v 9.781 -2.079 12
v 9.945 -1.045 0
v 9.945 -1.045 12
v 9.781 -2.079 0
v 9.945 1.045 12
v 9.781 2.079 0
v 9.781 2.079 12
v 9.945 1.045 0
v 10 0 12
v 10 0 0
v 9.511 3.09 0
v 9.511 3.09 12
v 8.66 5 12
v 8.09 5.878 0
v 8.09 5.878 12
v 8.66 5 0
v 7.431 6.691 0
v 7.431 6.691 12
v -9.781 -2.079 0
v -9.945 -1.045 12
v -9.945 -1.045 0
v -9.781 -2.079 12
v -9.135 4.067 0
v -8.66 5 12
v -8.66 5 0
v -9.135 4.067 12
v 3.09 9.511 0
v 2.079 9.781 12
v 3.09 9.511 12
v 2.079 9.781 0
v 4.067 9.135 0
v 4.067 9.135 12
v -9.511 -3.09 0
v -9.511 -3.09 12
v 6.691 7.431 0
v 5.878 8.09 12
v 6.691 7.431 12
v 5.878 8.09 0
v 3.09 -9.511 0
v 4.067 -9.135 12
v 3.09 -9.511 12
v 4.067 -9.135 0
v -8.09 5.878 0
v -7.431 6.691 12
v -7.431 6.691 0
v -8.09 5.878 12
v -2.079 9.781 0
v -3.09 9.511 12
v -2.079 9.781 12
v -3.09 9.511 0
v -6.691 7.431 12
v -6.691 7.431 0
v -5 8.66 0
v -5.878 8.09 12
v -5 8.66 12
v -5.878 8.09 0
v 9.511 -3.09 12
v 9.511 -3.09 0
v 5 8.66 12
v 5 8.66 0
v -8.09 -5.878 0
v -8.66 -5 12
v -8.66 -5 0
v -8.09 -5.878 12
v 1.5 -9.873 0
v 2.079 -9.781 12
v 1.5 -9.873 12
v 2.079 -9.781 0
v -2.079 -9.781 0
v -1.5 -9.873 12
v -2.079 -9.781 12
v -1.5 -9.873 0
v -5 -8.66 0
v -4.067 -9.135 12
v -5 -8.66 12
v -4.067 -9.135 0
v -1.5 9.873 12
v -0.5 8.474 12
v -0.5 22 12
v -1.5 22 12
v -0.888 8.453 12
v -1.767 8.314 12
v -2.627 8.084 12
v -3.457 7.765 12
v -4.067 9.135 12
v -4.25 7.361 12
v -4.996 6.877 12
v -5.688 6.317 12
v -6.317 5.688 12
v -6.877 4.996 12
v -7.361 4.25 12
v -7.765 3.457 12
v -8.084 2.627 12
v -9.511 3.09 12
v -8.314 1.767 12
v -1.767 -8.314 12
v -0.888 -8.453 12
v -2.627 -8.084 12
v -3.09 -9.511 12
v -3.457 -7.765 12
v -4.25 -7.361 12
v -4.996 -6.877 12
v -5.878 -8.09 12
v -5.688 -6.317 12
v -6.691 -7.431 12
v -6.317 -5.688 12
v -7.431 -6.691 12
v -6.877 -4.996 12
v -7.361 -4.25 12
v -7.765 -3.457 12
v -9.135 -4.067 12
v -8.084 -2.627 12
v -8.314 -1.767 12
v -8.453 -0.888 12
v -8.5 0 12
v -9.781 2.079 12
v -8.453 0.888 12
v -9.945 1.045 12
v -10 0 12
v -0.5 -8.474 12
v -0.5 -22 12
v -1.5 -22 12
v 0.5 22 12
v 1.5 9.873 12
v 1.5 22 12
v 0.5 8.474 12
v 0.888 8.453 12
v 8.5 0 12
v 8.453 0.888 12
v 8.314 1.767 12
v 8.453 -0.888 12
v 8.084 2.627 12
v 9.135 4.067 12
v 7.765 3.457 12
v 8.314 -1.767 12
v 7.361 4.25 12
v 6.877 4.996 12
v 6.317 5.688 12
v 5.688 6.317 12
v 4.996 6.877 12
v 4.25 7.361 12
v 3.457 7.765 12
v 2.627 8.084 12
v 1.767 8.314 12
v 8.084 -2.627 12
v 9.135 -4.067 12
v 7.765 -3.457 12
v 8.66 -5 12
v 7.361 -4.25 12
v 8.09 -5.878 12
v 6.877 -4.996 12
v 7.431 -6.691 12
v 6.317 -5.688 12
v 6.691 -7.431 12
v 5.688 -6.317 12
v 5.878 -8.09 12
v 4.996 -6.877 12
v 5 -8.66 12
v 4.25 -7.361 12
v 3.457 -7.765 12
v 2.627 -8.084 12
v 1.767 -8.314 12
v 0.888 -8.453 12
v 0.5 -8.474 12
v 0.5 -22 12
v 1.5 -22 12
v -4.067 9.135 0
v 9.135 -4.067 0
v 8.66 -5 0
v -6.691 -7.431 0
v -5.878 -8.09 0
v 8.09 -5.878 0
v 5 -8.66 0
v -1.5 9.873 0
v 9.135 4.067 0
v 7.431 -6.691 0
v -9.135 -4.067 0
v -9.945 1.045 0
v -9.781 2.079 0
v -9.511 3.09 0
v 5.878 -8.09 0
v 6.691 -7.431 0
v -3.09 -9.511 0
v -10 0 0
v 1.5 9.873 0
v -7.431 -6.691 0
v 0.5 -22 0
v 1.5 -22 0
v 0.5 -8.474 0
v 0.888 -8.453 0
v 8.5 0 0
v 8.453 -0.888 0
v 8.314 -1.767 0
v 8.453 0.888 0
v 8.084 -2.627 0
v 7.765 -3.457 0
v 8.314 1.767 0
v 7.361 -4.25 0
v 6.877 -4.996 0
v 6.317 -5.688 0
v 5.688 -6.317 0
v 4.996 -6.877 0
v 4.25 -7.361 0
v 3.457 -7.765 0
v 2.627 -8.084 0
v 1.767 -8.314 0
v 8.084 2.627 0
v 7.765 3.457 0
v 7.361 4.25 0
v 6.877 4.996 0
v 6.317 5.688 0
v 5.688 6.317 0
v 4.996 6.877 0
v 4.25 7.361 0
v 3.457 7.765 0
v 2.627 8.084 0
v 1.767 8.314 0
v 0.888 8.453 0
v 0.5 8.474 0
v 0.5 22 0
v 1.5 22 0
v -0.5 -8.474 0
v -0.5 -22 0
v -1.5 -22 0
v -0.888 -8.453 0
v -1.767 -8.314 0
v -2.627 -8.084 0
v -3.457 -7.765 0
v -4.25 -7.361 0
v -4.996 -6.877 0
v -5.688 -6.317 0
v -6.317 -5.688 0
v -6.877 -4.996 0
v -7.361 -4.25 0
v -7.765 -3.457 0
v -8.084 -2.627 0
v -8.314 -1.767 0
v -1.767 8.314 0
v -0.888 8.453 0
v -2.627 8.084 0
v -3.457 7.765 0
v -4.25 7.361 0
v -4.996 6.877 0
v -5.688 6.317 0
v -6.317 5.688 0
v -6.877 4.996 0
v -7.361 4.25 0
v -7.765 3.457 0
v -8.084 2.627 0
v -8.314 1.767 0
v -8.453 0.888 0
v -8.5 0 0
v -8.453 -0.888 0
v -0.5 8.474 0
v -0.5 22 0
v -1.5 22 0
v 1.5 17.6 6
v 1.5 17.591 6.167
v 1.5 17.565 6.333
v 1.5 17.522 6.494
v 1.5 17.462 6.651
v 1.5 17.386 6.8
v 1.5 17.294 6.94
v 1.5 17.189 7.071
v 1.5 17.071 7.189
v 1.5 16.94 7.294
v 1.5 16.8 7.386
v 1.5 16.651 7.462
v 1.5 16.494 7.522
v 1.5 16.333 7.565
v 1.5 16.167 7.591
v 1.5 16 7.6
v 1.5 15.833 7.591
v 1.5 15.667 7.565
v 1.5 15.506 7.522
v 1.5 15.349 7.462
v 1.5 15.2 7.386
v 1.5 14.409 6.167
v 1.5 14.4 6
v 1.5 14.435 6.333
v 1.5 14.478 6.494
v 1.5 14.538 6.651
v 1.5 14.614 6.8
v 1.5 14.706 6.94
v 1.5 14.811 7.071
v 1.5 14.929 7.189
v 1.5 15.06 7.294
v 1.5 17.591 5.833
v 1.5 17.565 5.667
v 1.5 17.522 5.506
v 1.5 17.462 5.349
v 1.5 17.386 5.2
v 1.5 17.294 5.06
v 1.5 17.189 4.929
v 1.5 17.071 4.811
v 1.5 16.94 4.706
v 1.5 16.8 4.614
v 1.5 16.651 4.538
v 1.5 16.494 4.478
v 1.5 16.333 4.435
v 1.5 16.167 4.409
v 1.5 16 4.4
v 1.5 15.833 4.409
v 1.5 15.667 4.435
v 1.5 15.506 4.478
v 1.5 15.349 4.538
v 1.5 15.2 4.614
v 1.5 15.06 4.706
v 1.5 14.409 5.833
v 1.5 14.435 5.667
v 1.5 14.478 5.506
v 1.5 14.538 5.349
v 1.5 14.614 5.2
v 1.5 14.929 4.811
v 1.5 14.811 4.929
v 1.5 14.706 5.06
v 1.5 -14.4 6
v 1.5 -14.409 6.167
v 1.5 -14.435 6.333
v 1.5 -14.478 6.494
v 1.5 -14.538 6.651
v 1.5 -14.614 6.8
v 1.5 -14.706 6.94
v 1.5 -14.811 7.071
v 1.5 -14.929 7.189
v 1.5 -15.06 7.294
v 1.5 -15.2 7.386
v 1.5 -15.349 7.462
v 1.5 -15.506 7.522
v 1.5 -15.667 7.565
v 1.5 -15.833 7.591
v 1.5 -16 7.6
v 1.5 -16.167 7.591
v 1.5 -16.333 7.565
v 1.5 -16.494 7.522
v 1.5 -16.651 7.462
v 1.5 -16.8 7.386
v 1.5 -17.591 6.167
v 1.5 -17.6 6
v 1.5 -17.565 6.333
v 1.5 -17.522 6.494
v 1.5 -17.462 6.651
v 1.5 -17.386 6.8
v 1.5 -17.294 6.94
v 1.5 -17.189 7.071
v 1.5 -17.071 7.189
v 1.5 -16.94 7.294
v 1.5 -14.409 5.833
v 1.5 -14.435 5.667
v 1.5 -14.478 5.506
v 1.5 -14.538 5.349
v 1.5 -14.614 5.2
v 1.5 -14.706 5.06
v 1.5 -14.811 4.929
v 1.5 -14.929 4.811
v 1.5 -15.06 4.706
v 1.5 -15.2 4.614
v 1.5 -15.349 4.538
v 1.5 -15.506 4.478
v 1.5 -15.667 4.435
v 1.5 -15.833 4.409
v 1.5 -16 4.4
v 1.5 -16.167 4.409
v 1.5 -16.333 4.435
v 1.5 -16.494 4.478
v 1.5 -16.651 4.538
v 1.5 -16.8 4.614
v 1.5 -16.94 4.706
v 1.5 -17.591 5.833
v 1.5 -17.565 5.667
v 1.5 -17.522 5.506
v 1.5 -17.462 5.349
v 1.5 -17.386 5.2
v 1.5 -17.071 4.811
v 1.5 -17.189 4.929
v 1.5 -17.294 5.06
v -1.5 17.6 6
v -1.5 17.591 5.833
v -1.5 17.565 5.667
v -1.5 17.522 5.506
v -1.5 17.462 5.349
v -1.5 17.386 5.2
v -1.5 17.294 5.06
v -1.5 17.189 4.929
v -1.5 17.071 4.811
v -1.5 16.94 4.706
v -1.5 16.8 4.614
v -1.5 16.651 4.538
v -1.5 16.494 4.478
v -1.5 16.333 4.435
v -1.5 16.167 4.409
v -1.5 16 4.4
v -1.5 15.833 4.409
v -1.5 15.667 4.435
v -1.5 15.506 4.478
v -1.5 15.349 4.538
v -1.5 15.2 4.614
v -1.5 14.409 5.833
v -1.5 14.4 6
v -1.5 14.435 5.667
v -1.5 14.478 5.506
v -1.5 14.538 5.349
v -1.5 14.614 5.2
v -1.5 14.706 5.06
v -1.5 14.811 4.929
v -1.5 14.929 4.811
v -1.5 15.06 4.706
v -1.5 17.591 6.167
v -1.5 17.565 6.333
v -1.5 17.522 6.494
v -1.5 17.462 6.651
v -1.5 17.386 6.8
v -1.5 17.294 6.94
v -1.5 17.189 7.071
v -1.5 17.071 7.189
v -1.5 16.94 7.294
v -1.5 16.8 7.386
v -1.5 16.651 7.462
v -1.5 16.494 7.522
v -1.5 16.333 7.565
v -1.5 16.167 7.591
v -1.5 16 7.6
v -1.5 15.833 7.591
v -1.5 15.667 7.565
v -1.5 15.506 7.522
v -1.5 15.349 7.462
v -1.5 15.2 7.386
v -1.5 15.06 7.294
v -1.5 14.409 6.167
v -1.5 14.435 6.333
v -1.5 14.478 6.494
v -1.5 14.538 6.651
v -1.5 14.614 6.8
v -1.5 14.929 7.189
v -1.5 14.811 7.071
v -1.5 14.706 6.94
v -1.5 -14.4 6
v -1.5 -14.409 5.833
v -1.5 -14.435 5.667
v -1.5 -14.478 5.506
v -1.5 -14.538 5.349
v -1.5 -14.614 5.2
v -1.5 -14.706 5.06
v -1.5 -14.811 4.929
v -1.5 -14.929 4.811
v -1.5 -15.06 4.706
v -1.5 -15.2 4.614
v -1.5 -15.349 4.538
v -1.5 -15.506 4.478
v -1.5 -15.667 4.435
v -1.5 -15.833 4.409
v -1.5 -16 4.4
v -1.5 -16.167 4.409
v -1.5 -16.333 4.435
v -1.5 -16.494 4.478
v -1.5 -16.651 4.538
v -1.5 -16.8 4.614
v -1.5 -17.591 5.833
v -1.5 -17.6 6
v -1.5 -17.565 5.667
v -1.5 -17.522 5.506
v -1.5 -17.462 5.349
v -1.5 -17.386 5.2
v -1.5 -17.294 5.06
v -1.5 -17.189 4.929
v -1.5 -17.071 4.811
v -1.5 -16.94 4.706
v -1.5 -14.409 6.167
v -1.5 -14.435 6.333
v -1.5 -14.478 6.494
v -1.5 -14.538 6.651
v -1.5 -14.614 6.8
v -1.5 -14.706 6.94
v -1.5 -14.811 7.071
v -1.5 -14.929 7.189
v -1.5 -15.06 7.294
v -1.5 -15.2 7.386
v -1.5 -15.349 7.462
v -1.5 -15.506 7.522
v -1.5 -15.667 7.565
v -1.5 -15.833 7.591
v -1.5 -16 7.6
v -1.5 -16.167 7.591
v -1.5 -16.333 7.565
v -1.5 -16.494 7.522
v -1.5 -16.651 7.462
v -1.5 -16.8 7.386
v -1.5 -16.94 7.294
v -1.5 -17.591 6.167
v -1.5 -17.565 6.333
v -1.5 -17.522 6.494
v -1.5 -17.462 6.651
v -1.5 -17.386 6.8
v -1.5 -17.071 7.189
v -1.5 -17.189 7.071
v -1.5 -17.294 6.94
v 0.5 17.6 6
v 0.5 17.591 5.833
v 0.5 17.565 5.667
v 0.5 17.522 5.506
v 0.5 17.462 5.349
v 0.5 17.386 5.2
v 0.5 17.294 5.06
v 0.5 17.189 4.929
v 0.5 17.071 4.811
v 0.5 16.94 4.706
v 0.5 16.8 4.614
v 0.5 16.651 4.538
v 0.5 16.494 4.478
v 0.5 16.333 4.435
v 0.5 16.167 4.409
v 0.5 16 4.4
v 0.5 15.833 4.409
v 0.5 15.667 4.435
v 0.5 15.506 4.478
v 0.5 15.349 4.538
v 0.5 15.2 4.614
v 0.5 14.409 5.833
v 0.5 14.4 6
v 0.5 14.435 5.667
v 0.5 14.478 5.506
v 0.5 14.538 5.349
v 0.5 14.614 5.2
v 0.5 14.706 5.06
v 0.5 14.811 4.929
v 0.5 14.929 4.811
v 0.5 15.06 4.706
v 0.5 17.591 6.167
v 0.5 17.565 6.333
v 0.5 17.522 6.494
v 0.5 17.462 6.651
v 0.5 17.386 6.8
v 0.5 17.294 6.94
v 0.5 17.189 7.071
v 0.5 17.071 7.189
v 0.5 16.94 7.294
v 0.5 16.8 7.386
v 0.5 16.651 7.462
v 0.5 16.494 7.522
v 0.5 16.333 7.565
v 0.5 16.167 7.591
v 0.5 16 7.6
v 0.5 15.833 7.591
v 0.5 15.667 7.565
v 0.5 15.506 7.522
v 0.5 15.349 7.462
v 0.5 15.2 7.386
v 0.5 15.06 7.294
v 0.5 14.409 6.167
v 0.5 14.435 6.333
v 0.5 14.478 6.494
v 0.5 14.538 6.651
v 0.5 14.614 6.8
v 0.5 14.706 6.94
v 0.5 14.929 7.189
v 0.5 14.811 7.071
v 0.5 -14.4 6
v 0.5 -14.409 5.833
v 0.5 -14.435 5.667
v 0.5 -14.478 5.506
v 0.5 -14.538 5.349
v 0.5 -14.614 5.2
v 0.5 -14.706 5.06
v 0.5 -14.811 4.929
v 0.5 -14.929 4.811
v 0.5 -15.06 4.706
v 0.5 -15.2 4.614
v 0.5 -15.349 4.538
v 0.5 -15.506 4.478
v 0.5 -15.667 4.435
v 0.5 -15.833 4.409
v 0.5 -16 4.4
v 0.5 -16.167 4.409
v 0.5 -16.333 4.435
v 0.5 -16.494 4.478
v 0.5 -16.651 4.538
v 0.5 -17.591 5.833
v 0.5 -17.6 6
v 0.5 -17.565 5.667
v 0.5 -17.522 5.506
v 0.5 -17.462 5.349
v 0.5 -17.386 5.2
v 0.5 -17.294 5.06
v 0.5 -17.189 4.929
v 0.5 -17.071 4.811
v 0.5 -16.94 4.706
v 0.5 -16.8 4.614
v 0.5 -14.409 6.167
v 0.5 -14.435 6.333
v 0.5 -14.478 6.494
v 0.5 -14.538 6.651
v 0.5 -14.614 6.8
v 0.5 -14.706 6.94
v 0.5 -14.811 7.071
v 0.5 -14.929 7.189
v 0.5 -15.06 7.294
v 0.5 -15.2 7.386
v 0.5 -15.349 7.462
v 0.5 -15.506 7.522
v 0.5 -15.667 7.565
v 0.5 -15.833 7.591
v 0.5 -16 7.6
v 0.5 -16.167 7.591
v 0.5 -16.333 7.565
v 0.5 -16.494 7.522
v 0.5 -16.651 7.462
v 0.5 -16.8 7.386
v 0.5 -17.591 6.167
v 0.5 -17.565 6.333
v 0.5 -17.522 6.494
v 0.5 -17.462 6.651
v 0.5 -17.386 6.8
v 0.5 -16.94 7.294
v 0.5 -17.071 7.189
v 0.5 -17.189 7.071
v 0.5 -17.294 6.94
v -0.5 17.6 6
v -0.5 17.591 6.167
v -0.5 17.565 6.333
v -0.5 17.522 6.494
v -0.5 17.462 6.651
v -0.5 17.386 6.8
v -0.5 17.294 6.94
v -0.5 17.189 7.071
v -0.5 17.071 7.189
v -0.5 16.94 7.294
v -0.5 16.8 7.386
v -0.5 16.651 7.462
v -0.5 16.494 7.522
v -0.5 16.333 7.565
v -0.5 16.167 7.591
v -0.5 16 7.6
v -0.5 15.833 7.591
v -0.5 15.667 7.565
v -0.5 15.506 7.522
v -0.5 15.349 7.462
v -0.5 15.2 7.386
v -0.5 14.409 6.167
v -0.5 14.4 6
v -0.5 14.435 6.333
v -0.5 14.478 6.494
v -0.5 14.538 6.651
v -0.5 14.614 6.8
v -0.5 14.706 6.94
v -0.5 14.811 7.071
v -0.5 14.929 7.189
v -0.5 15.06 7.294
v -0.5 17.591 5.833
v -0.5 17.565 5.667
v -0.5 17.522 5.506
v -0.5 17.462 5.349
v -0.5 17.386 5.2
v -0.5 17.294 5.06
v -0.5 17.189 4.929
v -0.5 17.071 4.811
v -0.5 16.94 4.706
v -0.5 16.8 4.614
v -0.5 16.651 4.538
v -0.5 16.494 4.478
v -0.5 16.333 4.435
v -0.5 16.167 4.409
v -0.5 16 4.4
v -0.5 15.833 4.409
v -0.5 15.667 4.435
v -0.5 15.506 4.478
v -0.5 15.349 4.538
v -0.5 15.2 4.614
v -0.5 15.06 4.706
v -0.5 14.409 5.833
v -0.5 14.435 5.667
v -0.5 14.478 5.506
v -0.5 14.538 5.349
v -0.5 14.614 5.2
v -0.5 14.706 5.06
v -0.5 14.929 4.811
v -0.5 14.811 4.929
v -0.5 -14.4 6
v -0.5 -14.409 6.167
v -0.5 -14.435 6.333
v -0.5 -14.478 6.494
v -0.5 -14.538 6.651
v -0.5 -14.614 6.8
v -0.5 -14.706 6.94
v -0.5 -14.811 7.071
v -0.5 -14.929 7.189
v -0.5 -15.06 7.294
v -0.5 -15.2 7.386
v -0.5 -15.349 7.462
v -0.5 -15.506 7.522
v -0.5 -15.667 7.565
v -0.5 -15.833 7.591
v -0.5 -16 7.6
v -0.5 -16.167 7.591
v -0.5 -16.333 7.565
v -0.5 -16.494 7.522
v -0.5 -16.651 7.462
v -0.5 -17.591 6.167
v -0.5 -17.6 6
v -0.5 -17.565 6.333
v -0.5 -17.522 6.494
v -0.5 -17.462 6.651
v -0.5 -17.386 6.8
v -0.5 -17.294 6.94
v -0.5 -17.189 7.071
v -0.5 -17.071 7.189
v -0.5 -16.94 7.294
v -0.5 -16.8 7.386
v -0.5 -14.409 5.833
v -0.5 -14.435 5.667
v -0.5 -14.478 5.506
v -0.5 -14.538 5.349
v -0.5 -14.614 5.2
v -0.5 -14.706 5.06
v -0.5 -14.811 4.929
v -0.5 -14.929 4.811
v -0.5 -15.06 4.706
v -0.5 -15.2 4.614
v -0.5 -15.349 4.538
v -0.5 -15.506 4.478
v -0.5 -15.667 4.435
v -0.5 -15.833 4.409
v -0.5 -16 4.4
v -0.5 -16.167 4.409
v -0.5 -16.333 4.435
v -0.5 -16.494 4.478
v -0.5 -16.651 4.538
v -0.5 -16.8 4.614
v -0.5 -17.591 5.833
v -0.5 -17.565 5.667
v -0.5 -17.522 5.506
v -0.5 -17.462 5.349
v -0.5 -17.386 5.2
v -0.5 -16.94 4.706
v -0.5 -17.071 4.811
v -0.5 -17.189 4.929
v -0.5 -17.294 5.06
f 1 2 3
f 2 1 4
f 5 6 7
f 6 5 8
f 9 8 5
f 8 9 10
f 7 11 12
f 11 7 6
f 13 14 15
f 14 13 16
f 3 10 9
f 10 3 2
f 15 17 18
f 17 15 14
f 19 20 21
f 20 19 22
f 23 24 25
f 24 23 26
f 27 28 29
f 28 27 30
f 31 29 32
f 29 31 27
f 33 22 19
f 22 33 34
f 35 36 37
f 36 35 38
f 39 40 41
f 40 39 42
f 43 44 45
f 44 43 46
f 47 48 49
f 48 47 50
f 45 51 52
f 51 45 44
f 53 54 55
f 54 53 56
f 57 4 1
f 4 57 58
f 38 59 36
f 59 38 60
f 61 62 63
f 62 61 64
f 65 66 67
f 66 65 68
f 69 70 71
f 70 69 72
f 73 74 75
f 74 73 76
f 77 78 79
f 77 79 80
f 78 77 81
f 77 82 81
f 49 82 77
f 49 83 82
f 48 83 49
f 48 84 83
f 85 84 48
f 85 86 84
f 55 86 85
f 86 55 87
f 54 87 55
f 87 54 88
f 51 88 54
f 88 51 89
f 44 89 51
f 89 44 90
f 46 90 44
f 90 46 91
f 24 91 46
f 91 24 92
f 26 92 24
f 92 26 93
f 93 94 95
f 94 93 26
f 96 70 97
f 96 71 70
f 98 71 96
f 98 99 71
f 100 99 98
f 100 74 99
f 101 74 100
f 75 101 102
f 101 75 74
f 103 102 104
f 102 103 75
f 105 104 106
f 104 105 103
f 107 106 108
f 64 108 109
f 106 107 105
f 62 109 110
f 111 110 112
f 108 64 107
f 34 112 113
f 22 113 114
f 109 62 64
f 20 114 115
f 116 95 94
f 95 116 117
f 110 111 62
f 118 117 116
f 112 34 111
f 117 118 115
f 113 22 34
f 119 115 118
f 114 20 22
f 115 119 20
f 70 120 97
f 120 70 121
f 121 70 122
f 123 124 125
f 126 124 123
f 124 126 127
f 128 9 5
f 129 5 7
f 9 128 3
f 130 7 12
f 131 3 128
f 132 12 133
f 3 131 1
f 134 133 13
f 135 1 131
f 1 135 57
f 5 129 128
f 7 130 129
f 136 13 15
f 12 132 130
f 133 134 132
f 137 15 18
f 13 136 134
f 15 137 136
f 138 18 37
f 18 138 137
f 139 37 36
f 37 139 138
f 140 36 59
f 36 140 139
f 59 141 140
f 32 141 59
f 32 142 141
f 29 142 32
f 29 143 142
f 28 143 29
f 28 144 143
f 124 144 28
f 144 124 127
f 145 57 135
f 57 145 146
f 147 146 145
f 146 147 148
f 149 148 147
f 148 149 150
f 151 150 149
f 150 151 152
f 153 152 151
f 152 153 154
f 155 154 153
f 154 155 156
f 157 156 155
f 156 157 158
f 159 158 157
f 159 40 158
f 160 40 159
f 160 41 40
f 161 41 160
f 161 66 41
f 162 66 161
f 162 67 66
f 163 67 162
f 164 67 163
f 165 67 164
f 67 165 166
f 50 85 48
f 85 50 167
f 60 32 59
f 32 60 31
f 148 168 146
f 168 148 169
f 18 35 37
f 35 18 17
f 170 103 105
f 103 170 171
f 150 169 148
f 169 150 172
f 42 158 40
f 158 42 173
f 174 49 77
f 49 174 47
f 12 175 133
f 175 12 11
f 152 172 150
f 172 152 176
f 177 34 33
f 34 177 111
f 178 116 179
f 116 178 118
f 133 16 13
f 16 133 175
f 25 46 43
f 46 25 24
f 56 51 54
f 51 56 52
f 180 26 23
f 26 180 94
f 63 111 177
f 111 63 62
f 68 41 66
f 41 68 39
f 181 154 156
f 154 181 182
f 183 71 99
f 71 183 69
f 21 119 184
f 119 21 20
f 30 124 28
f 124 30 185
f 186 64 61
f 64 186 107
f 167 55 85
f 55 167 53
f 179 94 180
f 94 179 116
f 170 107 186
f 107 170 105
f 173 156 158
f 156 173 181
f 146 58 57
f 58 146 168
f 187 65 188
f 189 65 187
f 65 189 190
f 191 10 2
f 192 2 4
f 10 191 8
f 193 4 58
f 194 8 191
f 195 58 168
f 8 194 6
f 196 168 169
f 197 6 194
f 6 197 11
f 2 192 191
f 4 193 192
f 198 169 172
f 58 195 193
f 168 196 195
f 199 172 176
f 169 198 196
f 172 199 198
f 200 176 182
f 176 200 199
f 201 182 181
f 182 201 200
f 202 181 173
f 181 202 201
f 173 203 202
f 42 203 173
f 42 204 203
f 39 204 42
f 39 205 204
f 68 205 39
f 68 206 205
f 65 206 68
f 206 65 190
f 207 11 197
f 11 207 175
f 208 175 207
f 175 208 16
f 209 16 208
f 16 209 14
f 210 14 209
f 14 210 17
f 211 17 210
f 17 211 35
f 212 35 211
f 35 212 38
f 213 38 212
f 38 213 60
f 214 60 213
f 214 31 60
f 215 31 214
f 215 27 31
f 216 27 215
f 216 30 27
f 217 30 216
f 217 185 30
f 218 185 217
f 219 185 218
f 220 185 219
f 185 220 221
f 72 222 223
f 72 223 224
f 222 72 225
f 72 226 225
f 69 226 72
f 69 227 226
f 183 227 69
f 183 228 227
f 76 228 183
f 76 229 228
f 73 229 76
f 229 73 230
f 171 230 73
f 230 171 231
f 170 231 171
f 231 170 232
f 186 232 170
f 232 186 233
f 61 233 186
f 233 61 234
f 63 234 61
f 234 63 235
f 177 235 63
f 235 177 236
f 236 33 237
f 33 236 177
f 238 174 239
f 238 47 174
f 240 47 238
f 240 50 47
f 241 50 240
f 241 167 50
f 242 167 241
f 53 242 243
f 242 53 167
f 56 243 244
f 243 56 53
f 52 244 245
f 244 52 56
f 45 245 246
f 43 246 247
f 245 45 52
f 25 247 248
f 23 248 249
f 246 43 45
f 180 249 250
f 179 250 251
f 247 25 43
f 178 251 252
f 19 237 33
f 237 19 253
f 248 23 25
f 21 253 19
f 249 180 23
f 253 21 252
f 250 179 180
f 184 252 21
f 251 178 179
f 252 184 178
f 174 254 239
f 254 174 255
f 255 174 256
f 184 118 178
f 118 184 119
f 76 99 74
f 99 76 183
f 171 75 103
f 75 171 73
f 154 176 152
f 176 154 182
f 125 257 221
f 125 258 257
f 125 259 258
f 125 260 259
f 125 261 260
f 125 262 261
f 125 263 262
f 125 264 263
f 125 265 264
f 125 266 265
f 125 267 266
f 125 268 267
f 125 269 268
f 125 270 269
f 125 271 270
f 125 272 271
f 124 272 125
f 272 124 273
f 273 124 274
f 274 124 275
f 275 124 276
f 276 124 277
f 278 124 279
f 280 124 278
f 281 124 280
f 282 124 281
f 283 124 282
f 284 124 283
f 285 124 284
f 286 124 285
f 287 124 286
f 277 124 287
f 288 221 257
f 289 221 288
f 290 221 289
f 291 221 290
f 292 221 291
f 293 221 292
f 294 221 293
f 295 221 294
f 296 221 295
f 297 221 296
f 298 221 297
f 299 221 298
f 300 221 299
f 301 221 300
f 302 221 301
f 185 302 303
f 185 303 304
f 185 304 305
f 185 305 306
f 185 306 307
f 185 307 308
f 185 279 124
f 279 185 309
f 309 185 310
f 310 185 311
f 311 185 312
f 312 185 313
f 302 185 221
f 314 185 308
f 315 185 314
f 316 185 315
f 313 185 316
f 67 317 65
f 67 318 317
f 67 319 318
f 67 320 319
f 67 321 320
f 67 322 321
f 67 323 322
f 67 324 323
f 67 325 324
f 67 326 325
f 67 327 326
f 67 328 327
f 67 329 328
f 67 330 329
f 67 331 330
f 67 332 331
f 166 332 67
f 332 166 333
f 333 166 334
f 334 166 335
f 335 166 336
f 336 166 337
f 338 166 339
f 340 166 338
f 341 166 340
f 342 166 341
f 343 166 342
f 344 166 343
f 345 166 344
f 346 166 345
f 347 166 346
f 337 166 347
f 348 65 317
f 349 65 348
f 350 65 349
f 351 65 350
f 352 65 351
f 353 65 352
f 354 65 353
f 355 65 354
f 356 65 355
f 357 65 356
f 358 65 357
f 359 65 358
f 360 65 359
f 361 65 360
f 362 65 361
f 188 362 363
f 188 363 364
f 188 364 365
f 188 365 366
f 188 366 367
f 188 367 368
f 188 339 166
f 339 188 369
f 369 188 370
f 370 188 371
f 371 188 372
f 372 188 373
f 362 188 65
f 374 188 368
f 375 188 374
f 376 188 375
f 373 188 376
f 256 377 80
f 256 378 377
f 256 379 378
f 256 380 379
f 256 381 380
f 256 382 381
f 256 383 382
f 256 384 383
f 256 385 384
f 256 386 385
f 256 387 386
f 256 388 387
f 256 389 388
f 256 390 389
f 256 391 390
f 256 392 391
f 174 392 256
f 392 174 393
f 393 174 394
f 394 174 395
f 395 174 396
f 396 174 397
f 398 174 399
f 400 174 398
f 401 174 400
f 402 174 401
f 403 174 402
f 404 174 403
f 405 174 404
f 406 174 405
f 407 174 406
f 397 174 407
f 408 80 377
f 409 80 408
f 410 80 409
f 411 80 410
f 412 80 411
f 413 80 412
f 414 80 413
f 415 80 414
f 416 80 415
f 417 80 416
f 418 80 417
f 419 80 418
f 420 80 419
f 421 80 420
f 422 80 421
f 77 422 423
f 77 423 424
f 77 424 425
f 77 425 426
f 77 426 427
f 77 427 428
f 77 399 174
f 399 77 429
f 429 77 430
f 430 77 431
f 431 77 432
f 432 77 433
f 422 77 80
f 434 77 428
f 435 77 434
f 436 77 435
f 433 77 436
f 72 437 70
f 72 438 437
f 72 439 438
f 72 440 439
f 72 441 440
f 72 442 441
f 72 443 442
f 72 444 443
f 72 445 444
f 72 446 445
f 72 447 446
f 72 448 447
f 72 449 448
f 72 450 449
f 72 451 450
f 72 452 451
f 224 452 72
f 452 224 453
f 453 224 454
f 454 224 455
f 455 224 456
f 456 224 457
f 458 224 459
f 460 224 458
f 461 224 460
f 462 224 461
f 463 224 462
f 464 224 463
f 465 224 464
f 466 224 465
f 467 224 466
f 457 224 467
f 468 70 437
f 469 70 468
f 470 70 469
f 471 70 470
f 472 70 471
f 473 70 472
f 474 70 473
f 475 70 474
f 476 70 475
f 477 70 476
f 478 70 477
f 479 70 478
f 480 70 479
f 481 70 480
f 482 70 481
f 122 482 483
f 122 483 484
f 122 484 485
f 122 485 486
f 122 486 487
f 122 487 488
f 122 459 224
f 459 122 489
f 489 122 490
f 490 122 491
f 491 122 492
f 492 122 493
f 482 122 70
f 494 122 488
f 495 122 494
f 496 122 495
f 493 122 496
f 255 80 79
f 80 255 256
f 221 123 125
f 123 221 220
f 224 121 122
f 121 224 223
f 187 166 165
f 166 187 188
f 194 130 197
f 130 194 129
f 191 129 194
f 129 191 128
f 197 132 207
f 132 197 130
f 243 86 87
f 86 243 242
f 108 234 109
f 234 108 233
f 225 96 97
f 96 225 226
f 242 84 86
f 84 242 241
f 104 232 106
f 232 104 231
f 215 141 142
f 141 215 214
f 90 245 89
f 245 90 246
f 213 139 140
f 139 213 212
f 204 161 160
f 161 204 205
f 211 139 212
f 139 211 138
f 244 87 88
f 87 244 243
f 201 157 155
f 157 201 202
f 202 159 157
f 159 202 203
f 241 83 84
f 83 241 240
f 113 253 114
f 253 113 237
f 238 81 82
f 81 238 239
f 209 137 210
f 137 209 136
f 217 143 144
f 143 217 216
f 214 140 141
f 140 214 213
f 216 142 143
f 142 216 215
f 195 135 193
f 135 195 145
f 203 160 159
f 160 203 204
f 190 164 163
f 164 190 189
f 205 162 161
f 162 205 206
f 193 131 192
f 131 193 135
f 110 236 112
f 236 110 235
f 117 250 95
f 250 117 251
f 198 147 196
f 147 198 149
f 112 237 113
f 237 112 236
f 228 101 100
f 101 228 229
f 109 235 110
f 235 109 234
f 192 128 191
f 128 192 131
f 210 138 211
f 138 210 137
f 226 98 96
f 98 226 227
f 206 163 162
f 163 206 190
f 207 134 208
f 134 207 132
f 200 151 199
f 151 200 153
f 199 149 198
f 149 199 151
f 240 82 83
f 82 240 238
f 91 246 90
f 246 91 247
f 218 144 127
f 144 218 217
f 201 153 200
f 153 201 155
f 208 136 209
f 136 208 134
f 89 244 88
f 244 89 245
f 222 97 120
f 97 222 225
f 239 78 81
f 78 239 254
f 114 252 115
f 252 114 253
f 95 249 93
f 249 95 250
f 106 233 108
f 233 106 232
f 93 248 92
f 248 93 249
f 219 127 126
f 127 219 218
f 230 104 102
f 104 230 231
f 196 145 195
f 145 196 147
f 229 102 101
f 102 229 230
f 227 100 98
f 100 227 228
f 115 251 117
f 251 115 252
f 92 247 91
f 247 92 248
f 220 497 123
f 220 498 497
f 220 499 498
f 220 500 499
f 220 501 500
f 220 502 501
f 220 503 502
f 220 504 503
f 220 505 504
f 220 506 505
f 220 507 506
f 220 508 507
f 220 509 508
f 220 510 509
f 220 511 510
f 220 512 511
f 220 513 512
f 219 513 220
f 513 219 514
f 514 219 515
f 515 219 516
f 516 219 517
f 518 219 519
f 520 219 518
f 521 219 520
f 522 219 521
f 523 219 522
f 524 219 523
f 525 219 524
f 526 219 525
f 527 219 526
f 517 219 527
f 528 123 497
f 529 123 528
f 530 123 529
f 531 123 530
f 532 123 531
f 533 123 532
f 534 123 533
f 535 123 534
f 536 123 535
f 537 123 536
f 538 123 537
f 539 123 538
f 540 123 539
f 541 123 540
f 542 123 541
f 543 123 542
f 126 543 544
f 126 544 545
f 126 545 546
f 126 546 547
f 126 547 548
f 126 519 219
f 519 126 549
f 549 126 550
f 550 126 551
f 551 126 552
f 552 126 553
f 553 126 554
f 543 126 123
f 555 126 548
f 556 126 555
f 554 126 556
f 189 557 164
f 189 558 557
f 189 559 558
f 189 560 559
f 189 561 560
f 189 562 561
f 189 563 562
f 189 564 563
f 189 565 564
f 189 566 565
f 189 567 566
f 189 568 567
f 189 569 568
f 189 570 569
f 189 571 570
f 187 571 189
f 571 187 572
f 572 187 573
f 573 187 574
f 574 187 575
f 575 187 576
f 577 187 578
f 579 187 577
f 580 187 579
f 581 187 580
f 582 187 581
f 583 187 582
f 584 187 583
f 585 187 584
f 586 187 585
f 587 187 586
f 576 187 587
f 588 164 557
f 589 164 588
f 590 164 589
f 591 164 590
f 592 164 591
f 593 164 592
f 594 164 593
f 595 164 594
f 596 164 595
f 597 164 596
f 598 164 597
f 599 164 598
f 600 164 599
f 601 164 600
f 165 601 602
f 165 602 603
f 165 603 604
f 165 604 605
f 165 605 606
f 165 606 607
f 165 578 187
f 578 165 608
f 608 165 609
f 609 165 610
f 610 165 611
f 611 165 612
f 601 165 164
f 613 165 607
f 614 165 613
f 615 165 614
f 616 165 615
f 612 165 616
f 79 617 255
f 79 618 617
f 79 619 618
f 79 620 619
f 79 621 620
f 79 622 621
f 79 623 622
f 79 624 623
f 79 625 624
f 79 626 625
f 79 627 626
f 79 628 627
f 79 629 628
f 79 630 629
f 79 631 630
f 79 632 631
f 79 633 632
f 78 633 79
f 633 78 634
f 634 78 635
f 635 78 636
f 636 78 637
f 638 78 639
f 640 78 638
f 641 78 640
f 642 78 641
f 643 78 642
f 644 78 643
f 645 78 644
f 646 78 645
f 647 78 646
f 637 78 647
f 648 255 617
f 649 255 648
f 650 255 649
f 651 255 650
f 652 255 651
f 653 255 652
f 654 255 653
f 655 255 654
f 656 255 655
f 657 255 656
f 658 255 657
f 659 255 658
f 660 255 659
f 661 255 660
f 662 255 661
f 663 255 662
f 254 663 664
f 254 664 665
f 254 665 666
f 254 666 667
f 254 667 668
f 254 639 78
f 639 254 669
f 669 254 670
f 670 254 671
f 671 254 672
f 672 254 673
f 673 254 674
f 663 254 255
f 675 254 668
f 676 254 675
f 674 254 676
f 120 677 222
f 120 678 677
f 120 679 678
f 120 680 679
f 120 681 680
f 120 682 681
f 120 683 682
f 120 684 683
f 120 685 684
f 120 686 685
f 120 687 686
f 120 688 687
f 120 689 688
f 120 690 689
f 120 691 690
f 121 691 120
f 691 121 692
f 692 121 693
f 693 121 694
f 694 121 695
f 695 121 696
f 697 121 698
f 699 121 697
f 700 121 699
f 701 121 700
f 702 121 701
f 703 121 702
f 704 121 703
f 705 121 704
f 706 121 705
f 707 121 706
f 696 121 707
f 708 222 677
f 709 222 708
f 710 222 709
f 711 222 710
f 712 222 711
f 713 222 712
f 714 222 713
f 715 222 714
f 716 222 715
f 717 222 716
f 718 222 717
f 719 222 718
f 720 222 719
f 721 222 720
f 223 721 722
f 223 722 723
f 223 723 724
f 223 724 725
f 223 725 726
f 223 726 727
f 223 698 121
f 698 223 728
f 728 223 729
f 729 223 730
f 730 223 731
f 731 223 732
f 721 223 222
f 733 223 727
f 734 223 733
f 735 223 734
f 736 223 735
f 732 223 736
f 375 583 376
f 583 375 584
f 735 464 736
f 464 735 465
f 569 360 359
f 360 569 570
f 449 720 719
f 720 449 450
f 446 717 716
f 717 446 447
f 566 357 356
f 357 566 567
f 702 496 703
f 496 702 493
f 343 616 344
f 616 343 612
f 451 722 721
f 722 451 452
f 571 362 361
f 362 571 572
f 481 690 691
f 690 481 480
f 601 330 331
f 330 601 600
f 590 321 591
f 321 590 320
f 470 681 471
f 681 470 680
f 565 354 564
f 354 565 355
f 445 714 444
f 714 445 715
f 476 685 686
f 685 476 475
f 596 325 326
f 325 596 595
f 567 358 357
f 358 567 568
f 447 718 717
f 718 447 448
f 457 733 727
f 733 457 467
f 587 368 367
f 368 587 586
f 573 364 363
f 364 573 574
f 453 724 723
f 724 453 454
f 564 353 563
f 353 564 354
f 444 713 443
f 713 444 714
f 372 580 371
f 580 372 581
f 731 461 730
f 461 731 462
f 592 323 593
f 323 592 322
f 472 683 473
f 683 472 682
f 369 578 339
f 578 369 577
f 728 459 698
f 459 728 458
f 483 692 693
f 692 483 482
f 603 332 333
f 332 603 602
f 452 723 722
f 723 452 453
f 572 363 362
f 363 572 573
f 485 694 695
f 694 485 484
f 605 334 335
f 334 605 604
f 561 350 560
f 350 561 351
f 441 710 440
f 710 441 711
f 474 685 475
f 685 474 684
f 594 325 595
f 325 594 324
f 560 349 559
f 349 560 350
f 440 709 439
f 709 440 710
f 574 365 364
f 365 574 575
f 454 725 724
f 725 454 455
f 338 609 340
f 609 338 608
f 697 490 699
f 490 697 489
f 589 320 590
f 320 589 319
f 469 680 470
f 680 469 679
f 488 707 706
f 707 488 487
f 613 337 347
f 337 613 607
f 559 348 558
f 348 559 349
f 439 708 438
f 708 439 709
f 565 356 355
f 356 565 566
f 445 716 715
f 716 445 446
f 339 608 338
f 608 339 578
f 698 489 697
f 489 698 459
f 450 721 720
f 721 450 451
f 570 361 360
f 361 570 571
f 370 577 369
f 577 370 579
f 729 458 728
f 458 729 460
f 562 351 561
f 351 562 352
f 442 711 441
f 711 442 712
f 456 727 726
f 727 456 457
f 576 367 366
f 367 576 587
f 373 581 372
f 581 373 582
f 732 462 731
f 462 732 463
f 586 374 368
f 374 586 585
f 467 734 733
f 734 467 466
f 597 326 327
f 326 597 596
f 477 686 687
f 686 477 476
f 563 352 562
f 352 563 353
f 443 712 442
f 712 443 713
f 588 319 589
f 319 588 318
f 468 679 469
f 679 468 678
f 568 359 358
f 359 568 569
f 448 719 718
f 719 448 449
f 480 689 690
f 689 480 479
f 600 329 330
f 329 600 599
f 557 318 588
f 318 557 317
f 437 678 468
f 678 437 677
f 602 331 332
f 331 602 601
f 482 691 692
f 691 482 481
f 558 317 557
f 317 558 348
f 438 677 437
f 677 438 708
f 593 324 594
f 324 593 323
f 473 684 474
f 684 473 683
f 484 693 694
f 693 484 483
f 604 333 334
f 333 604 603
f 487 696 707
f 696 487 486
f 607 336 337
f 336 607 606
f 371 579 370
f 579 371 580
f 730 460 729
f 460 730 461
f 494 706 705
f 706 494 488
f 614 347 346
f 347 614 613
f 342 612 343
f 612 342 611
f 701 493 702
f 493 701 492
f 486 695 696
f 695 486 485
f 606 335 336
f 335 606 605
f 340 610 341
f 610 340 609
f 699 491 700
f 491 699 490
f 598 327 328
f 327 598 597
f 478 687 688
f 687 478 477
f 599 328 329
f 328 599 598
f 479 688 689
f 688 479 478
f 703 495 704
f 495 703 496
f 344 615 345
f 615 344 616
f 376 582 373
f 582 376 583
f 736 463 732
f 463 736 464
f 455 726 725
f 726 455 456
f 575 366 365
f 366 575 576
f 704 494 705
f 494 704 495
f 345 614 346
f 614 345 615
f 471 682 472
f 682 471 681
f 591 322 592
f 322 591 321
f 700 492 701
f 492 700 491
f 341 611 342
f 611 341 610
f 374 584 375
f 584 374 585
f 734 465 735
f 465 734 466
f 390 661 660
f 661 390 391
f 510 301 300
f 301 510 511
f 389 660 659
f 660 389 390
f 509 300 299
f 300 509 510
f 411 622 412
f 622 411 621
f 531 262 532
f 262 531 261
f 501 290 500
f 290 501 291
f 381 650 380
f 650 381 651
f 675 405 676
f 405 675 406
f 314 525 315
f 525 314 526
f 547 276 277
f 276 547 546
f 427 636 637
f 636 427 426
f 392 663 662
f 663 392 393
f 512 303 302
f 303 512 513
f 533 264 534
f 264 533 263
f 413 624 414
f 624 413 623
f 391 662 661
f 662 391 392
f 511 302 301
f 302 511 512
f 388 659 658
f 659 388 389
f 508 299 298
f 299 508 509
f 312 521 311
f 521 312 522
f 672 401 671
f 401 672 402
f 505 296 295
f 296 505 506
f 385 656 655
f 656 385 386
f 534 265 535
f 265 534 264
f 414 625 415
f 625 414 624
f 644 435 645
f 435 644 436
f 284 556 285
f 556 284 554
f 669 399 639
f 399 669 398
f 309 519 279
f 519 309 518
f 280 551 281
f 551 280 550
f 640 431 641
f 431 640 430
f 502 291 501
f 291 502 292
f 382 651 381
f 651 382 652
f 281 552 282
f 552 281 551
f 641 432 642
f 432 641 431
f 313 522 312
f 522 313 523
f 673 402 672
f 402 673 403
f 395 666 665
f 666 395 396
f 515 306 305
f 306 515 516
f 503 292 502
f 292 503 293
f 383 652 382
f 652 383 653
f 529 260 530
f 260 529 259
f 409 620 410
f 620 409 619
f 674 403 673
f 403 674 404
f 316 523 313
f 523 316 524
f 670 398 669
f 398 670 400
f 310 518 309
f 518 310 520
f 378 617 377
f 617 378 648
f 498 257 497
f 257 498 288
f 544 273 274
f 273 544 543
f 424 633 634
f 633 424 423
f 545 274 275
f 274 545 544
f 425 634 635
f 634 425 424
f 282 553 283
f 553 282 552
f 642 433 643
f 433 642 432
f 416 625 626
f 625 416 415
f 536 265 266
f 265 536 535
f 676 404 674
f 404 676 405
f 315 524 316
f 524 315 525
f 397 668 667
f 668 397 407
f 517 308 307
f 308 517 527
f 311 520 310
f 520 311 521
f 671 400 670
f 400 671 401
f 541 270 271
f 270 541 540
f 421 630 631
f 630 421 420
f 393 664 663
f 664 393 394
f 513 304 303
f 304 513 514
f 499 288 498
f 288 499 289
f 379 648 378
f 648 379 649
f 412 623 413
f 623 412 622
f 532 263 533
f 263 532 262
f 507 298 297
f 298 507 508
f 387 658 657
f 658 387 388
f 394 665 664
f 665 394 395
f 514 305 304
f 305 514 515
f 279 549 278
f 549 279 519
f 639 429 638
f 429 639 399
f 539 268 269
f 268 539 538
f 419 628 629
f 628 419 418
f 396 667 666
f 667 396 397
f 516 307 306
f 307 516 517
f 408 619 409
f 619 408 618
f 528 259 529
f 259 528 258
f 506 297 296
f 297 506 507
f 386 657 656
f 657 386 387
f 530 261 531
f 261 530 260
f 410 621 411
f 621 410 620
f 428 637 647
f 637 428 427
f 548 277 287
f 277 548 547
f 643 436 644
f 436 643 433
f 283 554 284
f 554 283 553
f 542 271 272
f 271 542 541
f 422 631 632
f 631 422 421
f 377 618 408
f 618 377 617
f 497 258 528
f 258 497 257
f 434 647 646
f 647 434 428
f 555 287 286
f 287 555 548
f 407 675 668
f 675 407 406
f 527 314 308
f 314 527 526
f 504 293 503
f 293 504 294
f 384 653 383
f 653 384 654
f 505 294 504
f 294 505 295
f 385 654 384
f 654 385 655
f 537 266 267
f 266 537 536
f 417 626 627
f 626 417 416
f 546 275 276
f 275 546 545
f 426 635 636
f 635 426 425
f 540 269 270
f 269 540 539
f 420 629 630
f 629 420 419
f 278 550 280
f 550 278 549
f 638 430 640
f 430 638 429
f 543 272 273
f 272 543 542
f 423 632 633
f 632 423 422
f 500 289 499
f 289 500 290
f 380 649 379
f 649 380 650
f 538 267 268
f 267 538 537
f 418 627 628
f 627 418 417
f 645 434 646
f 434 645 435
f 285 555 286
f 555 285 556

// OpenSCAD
pen_diameter = 17; //mm 
arm_height = 12; //mm 
thickness = 1.5; //mm
tab_length = arm_height;
gap = 1;//mm
screw_diameter = 3.2; //mm

$fn=60;

difference() {
    union() {
        cylinder(r=pen_diameter / 2 + thickness, h=arm_height);
        translate([- thickness, (pen_diameter / 2 + thickness + tab_length) * -1, 0]) {
            cube([
                thickness * 2, 
                pen_diameter + thickness * 2 + tab_length * 2, 
                arm_height
            ]);
        } 
    }
    cylinder(r=pen_diameter / 2, h=arm_height);
    translate([gap / -2, (pen_diameter / 2 + thickness + tab_length) * -1, 0]) {
        cube([
            gap, 
            pen_diameter + thickness * 2 + tab_length * 2, 
            arm_height
        ]);
    } 
    translate([
        -thickness, 
        (pen_diameter / 2 + thickness + tab_length / 2) * -1, 
        arm_height / 2
    ]) {
        rotate([0,90,0]) {
            cylinder(r=screw_diameter / 2, h = 2 * thickness);
        }
    }
    
    translate([
        -thickness, 
        (pen_diameter / 2 + thickness + tab_length / 2), 
        arm_height / 2
    ]) {
        rotate([0,90,0]) {
            cylinder(r=screw_diameter / 2, h = 2 * thickness);
        }
    }

}
